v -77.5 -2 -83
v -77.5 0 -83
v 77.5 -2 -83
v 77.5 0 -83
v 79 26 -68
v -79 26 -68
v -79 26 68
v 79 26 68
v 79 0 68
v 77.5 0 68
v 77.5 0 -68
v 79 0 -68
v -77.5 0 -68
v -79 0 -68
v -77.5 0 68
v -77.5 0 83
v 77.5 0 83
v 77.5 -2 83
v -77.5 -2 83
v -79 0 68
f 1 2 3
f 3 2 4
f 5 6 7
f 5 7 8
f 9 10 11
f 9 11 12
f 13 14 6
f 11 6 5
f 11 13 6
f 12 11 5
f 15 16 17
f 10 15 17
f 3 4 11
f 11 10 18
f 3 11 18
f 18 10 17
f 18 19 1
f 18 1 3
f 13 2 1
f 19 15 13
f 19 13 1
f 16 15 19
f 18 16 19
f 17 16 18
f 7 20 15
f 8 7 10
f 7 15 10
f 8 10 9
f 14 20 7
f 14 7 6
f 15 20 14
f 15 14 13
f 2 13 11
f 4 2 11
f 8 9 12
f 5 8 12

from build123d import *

# Parameters (mm, degrees)
SKETCH_1_W      = 158
SKETCH_1_H      = 136
EXTRUDE_1_DEPTH = 26
SKETCH_2_W      = 155
SKETCH_2_H      = 166
EXTRUDE_2_DEPTH = 2


with BuildPart() as part:
    # 草图1 → 拉伸1 (new body)
    with BuildSketch(Plane(origin=(0, 0, 0), x_dir=(1, 0, 0), z_dir=(0, 1, 0))):
        Rectangle(SKETCH_1_W, SKETCH_1_H)
    extrude(amount=EXTRUDE_1_DEPTH)

    # 草图2 → 拉伸2 (add)
    with BuildSketch(Plane.XZ):
        Rectangle(SKETCH_2_W, SKETCH_2_H)
    extrude(amount=EXTRUDE_2_DEPTH)


solid = part.part
